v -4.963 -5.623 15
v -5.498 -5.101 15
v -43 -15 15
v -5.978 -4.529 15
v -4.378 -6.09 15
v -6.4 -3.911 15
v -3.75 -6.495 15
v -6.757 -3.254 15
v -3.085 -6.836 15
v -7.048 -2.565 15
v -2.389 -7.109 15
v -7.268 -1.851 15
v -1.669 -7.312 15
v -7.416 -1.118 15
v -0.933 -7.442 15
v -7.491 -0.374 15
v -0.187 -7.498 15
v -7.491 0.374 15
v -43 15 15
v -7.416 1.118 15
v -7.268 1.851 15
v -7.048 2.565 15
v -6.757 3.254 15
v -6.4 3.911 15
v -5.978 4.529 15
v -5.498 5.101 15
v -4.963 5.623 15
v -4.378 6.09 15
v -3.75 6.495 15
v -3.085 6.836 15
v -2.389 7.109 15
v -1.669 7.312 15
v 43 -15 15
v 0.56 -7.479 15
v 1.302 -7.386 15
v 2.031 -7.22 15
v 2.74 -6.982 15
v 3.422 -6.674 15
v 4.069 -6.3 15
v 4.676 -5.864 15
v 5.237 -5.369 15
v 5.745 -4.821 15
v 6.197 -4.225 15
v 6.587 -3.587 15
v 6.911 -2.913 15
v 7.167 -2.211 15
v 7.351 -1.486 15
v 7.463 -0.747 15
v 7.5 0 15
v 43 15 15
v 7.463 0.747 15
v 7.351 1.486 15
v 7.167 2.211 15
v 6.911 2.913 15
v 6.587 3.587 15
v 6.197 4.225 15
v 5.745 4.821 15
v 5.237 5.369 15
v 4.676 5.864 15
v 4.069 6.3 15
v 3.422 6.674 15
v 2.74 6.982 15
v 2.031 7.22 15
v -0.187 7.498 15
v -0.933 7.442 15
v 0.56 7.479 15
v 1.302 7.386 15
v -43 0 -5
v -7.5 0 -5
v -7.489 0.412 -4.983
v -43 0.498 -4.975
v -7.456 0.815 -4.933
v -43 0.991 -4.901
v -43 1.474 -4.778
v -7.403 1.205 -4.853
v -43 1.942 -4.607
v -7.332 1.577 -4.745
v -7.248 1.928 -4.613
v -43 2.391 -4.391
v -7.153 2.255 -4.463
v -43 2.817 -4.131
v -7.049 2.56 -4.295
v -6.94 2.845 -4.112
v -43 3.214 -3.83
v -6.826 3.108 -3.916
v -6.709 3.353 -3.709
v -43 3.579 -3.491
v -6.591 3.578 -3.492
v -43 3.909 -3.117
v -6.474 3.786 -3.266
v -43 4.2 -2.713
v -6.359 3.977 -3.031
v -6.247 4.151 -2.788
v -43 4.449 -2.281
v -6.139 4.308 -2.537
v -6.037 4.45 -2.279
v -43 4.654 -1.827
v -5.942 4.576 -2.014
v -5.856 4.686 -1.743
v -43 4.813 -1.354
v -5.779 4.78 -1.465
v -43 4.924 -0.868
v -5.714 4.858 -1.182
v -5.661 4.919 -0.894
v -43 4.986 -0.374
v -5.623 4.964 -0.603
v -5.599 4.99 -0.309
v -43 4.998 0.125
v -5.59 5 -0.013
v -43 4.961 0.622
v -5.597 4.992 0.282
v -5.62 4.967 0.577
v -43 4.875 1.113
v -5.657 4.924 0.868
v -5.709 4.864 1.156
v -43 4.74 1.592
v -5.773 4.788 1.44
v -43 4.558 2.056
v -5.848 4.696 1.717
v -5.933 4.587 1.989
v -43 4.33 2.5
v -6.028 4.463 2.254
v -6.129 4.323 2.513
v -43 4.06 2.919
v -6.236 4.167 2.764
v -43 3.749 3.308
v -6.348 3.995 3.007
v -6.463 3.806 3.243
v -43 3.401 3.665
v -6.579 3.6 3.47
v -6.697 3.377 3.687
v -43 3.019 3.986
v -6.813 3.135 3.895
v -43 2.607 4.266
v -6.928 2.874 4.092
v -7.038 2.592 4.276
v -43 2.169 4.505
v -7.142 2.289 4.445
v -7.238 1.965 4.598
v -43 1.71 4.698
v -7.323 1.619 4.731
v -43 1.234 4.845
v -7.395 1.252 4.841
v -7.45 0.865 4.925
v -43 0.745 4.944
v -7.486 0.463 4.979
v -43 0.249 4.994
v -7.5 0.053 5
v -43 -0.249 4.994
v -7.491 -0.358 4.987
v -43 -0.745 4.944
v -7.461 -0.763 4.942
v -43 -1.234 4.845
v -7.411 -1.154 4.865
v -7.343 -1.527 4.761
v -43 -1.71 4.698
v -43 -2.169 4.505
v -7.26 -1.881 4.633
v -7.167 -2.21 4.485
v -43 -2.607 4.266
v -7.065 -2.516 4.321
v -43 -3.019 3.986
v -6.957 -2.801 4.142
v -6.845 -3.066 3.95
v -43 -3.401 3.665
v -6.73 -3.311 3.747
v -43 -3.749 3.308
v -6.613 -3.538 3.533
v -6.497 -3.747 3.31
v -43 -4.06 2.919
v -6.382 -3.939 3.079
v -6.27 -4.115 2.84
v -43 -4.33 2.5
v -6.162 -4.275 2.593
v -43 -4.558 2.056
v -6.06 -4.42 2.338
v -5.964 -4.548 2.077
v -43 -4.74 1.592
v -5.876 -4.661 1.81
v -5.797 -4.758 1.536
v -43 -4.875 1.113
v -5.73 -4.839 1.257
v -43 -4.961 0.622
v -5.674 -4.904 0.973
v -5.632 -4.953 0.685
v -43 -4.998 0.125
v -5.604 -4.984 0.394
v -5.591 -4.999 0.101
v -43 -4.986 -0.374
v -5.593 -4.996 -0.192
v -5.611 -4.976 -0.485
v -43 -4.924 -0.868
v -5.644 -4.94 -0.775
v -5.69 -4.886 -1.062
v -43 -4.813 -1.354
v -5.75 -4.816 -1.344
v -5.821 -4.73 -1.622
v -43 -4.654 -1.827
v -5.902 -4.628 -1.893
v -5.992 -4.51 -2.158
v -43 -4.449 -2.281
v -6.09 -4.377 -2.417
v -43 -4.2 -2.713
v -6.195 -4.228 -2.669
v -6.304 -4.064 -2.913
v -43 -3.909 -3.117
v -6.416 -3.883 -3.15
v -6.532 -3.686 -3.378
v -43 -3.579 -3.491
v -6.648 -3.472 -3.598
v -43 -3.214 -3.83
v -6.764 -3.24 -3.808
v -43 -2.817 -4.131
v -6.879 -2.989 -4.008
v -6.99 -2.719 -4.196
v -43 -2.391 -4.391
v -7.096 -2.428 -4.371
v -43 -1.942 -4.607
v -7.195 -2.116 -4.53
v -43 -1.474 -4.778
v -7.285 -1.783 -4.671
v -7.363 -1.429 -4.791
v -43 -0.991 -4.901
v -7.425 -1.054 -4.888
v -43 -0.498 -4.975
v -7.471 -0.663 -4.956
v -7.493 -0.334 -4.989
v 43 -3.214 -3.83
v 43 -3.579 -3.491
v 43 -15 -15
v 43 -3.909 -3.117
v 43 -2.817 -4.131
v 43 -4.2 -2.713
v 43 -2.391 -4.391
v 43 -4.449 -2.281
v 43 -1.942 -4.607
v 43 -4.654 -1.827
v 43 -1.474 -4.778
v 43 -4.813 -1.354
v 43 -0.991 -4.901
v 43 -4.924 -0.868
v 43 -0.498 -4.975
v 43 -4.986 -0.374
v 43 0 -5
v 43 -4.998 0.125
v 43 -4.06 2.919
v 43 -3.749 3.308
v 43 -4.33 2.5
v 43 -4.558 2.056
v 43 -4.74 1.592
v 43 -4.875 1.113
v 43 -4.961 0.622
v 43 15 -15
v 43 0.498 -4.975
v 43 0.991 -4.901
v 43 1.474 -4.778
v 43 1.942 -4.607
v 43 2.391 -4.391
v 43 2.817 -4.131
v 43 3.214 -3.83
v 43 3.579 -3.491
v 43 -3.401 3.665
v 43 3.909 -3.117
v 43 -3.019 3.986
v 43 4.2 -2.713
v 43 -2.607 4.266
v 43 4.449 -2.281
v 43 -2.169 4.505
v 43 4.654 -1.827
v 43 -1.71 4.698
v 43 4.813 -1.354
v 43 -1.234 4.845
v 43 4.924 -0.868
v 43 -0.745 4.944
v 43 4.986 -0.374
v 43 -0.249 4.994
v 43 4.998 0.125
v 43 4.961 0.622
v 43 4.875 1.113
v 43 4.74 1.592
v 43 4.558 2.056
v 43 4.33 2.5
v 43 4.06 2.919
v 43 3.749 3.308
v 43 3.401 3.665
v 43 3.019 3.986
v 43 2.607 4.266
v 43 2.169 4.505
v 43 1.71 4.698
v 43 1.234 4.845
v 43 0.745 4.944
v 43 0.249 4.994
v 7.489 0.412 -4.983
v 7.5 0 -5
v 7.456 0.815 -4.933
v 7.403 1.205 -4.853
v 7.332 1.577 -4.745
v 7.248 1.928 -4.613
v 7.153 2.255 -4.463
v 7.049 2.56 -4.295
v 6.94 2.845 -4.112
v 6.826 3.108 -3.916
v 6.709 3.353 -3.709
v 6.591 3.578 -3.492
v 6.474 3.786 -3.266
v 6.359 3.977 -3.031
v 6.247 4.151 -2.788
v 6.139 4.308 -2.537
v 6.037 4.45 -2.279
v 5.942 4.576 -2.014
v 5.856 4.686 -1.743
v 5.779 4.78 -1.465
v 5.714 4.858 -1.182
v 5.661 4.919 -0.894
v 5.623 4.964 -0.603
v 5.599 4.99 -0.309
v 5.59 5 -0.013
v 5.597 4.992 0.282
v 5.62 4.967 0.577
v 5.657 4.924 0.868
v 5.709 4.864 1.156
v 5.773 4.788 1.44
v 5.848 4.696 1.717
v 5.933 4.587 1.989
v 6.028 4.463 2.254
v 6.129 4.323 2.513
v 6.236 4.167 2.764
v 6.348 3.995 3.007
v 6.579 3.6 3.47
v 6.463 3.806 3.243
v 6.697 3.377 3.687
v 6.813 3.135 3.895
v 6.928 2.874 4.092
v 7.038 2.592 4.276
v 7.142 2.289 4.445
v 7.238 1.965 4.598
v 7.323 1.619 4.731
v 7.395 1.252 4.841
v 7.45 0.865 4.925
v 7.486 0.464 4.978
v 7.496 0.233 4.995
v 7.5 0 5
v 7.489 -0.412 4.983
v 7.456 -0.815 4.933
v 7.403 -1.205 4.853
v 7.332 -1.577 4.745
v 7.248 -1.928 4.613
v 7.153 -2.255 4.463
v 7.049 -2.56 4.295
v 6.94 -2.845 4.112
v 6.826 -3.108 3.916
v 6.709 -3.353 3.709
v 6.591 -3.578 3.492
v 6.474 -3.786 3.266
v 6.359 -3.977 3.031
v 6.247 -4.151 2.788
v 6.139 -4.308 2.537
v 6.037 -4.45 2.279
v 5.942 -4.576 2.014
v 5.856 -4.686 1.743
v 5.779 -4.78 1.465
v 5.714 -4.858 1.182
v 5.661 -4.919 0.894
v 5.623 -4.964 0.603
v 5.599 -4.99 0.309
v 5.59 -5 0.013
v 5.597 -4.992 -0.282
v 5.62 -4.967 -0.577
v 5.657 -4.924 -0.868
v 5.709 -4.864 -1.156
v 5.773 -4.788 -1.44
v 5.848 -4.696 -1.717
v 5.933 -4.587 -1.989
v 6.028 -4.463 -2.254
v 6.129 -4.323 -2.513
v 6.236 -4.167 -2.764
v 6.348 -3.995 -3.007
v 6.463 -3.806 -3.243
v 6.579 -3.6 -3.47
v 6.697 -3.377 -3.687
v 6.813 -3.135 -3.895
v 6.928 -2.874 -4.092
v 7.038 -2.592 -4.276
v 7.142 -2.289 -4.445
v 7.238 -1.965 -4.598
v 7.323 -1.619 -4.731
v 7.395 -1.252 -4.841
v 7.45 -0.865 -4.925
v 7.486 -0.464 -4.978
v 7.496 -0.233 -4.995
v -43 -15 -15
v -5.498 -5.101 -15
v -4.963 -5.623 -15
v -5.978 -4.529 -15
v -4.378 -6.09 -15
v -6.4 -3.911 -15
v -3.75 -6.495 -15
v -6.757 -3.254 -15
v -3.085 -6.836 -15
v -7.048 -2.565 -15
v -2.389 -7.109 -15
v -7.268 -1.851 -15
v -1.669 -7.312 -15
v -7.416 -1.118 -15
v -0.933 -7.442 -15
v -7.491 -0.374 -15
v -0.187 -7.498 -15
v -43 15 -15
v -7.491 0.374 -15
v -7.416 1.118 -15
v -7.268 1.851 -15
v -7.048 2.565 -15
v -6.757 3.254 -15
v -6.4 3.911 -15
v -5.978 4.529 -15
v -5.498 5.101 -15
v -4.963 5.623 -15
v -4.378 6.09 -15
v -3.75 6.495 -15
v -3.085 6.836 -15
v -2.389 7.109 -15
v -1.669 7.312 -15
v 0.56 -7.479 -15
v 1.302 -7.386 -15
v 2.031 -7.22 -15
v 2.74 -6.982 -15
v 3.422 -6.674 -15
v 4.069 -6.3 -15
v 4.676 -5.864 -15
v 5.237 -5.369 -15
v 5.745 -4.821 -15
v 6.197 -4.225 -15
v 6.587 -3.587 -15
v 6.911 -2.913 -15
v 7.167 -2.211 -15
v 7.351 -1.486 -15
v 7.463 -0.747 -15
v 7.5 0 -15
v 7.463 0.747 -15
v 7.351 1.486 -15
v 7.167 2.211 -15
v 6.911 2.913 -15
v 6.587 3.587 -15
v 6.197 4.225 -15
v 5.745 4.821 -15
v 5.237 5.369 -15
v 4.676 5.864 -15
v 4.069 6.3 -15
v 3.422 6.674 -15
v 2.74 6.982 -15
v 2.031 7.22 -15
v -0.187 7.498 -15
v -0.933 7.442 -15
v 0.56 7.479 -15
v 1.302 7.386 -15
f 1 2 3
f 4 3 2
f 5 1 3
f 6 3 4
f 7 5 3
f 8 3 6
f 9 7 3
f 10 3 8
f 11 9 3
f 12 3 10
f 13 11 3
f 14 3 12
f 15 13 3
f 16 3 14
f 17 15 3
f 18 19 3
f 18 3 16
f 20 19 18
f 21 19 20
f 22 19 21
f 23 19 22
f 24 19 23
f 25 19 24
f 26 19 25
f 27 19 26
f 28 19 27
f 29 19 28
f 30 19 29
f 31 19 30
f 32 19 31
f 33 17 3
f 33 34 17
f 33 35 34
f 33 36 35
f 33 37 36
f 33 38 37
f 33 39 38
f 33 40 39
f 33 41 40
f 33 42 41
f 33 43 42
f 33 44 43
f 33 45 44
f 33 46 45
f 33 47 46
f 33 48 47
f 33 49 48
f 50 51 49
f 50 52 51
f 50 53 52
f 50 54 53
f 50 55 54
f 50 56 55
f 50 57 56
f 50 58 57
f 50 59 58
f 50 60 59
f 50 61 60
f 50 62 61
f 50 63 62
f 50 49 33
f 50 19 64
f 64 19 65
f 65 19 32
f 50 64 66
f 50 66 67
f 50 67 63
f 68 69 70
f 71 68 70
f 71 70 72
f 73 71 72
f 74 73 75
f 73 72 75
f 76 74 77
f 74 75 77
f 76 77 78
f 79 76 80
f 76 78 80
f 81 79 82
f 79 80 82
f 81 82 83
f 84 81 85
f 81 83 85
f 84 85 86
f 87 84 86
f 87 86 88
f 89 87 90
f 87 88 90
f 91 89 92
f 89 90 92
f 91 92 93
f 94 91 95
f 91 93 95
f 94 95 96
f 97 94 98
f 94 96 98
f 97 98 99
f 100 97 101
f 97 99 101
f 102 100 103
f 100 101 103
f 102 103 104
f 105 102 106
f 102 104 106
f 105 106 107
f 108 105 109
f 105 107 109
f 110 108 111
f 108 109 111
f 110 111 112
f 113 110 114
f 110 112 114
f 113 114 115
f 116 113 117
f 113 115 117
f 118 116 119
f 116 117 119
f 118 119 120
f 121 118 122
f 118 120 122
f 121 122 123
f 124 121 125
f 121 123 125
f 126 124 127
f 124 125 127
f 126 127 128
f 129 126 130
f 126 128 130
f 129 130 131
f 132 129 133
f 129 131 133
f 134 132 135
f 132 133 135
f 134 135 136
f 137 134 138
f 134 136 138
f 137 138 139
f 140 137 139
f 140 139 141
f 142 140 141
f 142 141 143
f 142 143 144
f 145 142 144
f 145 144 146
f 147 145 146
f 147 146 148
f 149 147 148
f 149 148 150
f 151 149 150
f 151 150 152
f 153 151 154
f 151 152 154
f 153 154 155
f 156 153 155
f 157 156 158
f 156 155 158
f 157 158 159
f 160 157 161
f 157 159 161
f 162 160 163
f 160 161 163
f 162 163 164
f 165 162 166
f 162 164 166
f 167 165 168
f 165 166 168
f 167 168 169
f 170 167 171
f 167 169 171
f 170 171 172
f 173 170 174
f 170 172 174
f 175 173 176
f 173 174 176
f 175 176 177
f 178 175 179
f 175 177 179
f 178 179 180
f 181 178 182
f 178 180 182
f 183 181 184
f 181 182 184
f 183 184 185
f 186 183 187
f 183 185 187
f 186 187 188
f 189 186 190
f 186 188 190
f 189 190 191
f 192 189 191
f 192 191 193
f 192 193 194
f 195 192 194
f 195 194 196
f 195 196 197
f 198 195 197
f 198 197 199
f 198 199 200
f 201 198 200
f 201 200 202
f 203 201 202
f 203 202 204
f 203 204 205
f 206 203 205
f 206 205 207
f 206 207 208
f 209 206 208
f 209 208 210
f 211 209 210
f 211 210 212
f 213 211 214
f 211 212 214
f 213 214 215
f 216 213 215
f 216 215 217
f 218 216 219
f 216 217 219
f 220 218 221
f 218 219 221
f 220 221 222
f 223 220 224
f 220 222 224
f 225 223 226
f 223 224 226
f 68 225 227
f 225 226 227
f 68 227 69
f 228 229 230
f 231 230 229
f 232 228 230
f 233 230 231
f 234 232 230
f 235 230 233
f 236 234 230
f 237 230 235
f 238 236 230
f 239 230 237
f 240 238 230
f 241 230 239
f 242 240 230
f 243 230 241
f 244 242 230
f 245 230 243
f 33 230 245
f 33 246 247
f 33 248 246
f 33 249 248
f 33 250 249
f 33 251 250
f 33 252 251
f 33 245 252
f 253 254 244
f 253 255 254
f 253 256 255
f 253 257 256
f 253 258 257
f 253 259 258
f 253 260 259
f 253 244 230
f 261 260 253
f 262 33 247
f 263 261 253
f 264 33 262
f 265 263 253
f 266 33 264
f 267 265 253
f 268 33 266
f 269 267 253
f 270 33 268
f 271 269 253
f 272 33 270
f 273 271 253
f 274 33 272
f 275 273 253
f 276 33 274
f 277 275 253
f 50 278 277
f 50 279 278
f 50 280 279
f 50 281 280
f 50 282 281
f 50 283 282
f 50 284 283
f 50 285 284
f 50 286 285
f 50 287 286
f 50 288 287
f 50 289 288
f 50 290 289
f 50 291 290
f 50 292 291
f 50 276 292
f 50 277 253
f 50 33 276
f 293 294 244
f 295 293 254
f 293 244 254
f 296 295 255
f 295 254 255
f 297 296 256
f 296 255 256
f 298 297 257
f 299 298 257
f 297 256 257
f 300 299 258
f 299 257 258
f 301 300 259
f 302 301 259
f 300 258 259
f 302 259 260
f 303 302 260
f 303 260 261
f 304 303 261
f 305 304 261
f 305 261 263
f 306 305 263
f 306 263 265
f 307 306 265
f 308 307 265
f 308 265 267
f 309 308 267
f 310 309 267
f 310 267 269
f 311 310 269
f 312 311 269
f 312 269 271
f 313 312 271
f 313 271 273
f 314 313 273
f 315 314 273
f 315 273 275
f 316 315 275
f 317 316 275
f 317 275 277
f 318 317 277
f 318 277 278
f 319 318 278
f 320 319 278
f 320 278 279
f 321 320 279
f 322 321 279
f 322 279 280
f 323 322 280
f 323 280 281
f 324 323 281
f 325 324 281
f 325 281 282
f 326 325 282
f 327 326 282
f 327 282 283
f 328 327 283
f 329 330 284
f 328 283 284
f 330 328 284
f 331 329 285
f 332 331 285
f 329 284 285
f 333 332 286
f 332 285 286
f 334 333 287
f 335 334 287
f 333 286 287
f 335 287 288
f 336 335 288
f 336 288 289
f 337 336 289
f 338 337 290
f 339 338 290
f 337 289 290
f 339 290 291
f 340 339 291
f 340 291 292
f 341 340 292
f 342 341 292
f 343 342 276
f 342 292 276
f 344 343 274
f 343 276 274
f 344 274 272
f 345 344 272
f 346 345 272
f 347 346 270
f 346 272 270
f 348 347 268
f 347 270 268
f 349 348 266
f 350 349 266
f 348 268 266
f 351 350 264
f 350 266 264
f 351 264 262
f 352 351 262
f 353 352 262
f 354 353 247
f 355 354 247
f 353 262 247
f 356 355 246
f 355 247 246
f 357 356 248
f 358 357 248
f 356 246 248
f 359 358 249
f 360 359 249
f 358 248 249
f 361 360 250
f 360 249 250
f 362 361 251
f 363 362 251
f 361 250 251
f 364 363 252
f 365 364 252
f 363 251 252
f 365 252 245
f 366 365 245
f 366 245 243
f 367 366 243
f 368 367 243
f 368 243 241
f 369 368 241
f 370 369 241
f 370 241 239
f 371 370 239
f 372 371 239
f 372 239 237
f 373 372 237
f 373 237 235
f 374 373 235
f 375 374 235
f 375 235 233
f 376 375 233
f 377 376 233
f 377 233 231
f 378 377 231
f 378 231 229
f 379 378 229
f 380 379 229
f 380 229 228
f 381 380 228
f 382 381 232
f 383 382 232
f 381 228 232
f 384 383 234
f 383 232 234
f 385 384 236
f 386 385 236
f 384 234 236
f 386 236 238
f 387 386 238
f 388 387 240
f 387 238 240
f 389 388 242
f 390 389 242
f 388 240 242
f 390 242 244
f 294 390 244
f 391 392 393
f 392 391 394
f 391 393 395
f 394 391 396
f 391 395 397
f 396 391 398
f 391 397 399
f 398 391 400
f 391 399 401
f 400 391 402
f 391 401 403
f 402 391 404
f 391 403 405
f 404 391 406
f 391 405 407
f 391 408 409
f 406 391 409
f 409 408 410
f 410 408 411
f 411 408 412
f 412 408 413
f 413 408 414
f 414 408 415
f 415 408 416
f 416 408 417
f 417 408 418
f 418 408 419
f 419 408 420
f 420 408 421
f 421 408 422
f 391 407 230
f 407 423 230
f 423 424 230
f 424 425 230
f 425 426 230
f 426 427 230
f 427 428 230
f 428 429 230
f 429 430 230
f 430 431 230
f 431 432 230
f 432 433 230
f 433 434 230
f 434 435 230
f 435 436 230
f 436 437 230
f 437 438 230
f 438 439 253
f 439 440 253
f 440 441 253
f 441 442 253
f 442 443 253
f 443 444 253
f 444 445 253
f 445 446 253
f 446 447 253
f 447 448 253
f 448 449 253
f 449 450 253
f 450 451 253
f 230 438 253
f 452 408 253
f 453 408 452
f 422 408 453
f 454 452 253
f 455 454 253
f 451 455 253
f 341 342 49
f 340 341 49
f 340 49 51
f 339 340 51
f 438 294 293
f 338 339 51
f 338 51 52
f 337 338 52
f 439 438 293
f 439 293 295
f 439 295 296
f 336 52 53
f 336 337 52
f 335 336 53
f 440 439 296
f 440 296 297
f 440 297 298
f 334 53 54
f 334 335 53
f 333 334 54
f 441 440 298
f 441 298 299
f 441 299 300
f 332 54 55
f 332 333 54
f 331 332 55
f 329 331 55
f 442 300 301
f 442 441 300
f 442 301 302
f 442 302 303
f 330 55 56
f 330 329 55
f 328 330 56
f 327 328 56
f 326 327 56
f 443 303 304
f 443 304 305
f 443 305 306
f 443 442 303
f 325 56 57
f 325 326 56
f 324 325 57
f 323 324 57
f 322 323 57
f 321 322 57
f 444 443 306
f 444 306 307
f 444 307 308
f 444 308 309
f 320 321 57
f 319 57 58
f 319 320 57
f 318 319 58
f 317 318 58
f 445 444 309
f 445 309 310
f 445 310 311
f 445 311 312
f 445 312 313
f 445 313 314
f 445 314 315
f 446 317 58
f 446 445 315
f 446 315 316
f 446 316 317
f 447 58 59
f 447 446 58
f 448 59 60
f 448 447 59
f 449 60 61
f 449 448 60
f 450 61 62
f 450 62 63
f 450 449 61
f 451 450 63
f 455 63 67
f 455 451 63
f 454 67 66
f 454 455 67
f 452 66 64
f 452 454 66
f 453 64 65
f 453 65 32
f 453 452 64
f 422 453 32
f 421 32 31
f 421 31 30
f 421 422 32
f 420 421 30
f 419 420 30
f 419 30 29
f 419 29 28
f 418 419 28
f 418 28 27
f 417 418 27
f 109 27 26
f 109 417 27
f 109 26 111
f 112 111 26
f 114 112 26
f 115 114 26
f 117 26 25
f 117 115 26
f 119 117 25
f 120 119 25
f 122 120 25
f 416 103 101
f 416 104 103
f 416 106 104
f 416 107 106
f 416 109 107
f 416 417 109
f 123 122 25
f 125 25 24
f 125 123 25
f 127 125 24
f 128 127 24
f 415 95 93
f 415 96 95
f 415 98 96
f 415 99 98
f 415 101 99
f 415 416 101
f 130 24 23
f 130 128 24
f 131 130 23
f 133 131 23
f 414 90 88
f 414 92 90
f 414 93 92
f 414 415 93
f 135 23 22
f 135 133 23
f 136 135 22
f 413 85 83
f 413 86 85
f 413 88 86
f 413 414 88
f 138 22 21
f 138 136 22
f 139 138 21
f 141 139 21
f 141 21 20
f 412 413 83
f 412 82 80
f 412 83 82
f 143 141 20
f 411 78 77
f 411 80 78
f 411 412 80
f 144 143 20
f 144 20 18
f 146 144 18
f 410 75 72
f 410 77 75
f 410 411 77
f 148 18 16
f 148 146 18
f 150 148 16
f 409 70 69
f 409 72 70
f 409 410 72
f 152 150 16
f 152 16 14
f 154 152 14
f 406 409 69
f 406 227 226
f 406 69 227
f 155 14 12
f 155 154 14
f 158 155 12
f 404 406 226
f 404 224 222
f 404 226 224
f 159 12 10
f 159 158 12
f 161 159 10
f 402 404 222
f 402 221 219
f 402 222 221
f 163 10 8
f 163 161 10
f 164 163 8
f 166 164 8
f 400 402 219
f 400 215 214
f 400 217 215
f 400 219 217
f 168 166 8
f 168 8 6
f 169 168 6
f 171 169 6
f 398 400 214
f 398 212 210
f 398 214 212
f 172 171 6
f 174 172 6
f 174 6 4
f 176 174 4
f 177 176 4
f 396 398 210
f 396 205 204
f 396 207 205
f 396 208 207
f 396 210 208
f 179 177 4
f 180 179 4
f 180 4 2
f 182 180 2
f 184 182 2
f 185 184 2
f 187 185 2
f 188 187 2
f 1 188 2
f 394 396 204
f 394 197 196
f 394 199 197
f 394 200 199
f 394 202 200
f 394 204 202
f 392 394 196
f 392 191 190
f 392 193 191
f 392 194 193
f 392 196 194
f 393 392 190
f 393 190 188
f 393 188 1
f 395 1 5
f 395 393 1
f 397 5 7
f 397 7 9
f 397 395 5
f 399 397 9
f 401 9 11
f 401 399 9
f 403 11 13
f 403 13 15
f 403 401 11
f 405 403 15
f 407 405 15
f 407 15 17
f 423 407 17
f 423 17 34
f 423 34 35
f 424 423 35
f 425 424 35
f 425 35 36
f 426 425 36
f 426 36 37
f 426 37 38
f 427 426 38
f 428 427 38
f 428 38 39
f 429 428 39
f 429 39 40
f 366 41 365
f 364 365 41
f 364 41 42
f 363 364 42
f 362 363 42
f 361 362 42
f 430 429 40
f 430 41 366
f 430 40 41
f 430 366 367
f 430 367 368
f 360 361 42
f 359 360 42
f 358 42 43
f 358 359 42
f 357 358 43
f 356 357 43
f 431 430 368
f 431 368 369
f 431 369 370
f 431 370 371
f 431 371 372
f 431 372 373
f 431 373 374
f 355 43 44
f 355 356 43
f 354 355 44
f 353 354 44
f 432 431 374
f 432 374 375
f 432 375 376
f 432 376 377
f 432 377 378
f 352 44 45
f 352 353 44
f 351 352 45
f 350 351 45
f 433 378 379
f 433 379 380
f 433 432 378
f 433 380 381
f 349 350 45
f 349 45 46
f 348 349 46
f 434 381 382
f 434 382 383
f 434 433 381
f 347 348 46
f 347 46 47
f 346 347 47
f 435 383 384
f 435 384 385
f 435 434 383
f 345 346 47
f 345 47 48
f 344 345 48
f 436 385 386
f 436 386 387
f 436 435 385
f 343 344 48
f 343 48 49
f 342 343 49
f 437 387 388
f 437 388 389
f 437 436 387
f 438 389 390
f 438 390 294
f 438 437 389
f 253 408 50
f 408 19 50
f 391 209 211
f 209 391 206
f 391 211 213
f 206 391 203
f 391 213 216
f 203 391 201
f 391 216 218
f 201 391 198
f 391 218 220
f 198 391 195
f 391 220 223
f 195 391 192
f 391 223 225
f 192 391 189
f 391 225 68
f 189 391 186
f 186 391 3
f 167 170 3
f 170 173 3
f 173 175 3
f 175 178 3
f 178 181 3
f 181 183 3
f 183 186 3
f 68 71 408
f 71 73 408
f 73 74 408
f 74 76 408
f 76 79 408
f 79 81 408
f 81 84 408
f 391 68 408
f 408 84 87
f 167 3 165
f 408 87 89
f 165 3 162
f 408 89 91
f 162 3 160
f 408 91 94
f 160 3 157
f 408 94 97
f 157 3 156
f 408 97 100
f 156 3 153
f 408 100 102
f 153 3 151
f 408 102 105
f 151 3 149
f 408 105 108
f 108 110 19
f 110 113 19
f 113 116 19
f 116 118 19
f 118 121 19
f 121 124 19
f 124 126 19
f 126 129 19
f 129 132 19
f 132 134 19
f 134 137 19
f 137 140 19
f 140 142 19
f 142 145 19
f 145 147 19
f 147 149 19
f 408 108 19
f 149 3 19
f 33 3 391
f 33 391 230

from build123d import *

# Parameters (mm, degrees)
CROQUIS1_W              = 86
CROQUIS1_H              = 30
CROQUIS1_R              = 7.5
SALIENTE_EXTRUIR1_DEPTH = 15
CROQUIS2_R              = 5
CORTAR_EXTRUIR1_DEPTH   = 87


with BuildPart() as part:
    # Croquis1 → Saliente-Extruir1 (new body, symmetric)
    with BuildSketch(Plane.XY):
        Rectangle(CROQUIS1_W, CROQUIS1_H)
        Circle(CROQUIS1_R, mode=Mode.SUBTRACT)
    extrude(amount=SALIENTE_EXTRUIR1_DEPTH, both=True)

    # Croquis2 → Cortar-Extruir1 (cut, through all)
    with BuildSketch(Plane(origin=(43, 0, 0), x_dir=(0, 0, -1), z_dir=(1, 0, 0))):
        Circle(CROQUIS2_R)
    extrude(amount=-CORTAR_EXTRUIR1_DEPTH, mode=Mode.SUBTRACT)


solid = part.part
